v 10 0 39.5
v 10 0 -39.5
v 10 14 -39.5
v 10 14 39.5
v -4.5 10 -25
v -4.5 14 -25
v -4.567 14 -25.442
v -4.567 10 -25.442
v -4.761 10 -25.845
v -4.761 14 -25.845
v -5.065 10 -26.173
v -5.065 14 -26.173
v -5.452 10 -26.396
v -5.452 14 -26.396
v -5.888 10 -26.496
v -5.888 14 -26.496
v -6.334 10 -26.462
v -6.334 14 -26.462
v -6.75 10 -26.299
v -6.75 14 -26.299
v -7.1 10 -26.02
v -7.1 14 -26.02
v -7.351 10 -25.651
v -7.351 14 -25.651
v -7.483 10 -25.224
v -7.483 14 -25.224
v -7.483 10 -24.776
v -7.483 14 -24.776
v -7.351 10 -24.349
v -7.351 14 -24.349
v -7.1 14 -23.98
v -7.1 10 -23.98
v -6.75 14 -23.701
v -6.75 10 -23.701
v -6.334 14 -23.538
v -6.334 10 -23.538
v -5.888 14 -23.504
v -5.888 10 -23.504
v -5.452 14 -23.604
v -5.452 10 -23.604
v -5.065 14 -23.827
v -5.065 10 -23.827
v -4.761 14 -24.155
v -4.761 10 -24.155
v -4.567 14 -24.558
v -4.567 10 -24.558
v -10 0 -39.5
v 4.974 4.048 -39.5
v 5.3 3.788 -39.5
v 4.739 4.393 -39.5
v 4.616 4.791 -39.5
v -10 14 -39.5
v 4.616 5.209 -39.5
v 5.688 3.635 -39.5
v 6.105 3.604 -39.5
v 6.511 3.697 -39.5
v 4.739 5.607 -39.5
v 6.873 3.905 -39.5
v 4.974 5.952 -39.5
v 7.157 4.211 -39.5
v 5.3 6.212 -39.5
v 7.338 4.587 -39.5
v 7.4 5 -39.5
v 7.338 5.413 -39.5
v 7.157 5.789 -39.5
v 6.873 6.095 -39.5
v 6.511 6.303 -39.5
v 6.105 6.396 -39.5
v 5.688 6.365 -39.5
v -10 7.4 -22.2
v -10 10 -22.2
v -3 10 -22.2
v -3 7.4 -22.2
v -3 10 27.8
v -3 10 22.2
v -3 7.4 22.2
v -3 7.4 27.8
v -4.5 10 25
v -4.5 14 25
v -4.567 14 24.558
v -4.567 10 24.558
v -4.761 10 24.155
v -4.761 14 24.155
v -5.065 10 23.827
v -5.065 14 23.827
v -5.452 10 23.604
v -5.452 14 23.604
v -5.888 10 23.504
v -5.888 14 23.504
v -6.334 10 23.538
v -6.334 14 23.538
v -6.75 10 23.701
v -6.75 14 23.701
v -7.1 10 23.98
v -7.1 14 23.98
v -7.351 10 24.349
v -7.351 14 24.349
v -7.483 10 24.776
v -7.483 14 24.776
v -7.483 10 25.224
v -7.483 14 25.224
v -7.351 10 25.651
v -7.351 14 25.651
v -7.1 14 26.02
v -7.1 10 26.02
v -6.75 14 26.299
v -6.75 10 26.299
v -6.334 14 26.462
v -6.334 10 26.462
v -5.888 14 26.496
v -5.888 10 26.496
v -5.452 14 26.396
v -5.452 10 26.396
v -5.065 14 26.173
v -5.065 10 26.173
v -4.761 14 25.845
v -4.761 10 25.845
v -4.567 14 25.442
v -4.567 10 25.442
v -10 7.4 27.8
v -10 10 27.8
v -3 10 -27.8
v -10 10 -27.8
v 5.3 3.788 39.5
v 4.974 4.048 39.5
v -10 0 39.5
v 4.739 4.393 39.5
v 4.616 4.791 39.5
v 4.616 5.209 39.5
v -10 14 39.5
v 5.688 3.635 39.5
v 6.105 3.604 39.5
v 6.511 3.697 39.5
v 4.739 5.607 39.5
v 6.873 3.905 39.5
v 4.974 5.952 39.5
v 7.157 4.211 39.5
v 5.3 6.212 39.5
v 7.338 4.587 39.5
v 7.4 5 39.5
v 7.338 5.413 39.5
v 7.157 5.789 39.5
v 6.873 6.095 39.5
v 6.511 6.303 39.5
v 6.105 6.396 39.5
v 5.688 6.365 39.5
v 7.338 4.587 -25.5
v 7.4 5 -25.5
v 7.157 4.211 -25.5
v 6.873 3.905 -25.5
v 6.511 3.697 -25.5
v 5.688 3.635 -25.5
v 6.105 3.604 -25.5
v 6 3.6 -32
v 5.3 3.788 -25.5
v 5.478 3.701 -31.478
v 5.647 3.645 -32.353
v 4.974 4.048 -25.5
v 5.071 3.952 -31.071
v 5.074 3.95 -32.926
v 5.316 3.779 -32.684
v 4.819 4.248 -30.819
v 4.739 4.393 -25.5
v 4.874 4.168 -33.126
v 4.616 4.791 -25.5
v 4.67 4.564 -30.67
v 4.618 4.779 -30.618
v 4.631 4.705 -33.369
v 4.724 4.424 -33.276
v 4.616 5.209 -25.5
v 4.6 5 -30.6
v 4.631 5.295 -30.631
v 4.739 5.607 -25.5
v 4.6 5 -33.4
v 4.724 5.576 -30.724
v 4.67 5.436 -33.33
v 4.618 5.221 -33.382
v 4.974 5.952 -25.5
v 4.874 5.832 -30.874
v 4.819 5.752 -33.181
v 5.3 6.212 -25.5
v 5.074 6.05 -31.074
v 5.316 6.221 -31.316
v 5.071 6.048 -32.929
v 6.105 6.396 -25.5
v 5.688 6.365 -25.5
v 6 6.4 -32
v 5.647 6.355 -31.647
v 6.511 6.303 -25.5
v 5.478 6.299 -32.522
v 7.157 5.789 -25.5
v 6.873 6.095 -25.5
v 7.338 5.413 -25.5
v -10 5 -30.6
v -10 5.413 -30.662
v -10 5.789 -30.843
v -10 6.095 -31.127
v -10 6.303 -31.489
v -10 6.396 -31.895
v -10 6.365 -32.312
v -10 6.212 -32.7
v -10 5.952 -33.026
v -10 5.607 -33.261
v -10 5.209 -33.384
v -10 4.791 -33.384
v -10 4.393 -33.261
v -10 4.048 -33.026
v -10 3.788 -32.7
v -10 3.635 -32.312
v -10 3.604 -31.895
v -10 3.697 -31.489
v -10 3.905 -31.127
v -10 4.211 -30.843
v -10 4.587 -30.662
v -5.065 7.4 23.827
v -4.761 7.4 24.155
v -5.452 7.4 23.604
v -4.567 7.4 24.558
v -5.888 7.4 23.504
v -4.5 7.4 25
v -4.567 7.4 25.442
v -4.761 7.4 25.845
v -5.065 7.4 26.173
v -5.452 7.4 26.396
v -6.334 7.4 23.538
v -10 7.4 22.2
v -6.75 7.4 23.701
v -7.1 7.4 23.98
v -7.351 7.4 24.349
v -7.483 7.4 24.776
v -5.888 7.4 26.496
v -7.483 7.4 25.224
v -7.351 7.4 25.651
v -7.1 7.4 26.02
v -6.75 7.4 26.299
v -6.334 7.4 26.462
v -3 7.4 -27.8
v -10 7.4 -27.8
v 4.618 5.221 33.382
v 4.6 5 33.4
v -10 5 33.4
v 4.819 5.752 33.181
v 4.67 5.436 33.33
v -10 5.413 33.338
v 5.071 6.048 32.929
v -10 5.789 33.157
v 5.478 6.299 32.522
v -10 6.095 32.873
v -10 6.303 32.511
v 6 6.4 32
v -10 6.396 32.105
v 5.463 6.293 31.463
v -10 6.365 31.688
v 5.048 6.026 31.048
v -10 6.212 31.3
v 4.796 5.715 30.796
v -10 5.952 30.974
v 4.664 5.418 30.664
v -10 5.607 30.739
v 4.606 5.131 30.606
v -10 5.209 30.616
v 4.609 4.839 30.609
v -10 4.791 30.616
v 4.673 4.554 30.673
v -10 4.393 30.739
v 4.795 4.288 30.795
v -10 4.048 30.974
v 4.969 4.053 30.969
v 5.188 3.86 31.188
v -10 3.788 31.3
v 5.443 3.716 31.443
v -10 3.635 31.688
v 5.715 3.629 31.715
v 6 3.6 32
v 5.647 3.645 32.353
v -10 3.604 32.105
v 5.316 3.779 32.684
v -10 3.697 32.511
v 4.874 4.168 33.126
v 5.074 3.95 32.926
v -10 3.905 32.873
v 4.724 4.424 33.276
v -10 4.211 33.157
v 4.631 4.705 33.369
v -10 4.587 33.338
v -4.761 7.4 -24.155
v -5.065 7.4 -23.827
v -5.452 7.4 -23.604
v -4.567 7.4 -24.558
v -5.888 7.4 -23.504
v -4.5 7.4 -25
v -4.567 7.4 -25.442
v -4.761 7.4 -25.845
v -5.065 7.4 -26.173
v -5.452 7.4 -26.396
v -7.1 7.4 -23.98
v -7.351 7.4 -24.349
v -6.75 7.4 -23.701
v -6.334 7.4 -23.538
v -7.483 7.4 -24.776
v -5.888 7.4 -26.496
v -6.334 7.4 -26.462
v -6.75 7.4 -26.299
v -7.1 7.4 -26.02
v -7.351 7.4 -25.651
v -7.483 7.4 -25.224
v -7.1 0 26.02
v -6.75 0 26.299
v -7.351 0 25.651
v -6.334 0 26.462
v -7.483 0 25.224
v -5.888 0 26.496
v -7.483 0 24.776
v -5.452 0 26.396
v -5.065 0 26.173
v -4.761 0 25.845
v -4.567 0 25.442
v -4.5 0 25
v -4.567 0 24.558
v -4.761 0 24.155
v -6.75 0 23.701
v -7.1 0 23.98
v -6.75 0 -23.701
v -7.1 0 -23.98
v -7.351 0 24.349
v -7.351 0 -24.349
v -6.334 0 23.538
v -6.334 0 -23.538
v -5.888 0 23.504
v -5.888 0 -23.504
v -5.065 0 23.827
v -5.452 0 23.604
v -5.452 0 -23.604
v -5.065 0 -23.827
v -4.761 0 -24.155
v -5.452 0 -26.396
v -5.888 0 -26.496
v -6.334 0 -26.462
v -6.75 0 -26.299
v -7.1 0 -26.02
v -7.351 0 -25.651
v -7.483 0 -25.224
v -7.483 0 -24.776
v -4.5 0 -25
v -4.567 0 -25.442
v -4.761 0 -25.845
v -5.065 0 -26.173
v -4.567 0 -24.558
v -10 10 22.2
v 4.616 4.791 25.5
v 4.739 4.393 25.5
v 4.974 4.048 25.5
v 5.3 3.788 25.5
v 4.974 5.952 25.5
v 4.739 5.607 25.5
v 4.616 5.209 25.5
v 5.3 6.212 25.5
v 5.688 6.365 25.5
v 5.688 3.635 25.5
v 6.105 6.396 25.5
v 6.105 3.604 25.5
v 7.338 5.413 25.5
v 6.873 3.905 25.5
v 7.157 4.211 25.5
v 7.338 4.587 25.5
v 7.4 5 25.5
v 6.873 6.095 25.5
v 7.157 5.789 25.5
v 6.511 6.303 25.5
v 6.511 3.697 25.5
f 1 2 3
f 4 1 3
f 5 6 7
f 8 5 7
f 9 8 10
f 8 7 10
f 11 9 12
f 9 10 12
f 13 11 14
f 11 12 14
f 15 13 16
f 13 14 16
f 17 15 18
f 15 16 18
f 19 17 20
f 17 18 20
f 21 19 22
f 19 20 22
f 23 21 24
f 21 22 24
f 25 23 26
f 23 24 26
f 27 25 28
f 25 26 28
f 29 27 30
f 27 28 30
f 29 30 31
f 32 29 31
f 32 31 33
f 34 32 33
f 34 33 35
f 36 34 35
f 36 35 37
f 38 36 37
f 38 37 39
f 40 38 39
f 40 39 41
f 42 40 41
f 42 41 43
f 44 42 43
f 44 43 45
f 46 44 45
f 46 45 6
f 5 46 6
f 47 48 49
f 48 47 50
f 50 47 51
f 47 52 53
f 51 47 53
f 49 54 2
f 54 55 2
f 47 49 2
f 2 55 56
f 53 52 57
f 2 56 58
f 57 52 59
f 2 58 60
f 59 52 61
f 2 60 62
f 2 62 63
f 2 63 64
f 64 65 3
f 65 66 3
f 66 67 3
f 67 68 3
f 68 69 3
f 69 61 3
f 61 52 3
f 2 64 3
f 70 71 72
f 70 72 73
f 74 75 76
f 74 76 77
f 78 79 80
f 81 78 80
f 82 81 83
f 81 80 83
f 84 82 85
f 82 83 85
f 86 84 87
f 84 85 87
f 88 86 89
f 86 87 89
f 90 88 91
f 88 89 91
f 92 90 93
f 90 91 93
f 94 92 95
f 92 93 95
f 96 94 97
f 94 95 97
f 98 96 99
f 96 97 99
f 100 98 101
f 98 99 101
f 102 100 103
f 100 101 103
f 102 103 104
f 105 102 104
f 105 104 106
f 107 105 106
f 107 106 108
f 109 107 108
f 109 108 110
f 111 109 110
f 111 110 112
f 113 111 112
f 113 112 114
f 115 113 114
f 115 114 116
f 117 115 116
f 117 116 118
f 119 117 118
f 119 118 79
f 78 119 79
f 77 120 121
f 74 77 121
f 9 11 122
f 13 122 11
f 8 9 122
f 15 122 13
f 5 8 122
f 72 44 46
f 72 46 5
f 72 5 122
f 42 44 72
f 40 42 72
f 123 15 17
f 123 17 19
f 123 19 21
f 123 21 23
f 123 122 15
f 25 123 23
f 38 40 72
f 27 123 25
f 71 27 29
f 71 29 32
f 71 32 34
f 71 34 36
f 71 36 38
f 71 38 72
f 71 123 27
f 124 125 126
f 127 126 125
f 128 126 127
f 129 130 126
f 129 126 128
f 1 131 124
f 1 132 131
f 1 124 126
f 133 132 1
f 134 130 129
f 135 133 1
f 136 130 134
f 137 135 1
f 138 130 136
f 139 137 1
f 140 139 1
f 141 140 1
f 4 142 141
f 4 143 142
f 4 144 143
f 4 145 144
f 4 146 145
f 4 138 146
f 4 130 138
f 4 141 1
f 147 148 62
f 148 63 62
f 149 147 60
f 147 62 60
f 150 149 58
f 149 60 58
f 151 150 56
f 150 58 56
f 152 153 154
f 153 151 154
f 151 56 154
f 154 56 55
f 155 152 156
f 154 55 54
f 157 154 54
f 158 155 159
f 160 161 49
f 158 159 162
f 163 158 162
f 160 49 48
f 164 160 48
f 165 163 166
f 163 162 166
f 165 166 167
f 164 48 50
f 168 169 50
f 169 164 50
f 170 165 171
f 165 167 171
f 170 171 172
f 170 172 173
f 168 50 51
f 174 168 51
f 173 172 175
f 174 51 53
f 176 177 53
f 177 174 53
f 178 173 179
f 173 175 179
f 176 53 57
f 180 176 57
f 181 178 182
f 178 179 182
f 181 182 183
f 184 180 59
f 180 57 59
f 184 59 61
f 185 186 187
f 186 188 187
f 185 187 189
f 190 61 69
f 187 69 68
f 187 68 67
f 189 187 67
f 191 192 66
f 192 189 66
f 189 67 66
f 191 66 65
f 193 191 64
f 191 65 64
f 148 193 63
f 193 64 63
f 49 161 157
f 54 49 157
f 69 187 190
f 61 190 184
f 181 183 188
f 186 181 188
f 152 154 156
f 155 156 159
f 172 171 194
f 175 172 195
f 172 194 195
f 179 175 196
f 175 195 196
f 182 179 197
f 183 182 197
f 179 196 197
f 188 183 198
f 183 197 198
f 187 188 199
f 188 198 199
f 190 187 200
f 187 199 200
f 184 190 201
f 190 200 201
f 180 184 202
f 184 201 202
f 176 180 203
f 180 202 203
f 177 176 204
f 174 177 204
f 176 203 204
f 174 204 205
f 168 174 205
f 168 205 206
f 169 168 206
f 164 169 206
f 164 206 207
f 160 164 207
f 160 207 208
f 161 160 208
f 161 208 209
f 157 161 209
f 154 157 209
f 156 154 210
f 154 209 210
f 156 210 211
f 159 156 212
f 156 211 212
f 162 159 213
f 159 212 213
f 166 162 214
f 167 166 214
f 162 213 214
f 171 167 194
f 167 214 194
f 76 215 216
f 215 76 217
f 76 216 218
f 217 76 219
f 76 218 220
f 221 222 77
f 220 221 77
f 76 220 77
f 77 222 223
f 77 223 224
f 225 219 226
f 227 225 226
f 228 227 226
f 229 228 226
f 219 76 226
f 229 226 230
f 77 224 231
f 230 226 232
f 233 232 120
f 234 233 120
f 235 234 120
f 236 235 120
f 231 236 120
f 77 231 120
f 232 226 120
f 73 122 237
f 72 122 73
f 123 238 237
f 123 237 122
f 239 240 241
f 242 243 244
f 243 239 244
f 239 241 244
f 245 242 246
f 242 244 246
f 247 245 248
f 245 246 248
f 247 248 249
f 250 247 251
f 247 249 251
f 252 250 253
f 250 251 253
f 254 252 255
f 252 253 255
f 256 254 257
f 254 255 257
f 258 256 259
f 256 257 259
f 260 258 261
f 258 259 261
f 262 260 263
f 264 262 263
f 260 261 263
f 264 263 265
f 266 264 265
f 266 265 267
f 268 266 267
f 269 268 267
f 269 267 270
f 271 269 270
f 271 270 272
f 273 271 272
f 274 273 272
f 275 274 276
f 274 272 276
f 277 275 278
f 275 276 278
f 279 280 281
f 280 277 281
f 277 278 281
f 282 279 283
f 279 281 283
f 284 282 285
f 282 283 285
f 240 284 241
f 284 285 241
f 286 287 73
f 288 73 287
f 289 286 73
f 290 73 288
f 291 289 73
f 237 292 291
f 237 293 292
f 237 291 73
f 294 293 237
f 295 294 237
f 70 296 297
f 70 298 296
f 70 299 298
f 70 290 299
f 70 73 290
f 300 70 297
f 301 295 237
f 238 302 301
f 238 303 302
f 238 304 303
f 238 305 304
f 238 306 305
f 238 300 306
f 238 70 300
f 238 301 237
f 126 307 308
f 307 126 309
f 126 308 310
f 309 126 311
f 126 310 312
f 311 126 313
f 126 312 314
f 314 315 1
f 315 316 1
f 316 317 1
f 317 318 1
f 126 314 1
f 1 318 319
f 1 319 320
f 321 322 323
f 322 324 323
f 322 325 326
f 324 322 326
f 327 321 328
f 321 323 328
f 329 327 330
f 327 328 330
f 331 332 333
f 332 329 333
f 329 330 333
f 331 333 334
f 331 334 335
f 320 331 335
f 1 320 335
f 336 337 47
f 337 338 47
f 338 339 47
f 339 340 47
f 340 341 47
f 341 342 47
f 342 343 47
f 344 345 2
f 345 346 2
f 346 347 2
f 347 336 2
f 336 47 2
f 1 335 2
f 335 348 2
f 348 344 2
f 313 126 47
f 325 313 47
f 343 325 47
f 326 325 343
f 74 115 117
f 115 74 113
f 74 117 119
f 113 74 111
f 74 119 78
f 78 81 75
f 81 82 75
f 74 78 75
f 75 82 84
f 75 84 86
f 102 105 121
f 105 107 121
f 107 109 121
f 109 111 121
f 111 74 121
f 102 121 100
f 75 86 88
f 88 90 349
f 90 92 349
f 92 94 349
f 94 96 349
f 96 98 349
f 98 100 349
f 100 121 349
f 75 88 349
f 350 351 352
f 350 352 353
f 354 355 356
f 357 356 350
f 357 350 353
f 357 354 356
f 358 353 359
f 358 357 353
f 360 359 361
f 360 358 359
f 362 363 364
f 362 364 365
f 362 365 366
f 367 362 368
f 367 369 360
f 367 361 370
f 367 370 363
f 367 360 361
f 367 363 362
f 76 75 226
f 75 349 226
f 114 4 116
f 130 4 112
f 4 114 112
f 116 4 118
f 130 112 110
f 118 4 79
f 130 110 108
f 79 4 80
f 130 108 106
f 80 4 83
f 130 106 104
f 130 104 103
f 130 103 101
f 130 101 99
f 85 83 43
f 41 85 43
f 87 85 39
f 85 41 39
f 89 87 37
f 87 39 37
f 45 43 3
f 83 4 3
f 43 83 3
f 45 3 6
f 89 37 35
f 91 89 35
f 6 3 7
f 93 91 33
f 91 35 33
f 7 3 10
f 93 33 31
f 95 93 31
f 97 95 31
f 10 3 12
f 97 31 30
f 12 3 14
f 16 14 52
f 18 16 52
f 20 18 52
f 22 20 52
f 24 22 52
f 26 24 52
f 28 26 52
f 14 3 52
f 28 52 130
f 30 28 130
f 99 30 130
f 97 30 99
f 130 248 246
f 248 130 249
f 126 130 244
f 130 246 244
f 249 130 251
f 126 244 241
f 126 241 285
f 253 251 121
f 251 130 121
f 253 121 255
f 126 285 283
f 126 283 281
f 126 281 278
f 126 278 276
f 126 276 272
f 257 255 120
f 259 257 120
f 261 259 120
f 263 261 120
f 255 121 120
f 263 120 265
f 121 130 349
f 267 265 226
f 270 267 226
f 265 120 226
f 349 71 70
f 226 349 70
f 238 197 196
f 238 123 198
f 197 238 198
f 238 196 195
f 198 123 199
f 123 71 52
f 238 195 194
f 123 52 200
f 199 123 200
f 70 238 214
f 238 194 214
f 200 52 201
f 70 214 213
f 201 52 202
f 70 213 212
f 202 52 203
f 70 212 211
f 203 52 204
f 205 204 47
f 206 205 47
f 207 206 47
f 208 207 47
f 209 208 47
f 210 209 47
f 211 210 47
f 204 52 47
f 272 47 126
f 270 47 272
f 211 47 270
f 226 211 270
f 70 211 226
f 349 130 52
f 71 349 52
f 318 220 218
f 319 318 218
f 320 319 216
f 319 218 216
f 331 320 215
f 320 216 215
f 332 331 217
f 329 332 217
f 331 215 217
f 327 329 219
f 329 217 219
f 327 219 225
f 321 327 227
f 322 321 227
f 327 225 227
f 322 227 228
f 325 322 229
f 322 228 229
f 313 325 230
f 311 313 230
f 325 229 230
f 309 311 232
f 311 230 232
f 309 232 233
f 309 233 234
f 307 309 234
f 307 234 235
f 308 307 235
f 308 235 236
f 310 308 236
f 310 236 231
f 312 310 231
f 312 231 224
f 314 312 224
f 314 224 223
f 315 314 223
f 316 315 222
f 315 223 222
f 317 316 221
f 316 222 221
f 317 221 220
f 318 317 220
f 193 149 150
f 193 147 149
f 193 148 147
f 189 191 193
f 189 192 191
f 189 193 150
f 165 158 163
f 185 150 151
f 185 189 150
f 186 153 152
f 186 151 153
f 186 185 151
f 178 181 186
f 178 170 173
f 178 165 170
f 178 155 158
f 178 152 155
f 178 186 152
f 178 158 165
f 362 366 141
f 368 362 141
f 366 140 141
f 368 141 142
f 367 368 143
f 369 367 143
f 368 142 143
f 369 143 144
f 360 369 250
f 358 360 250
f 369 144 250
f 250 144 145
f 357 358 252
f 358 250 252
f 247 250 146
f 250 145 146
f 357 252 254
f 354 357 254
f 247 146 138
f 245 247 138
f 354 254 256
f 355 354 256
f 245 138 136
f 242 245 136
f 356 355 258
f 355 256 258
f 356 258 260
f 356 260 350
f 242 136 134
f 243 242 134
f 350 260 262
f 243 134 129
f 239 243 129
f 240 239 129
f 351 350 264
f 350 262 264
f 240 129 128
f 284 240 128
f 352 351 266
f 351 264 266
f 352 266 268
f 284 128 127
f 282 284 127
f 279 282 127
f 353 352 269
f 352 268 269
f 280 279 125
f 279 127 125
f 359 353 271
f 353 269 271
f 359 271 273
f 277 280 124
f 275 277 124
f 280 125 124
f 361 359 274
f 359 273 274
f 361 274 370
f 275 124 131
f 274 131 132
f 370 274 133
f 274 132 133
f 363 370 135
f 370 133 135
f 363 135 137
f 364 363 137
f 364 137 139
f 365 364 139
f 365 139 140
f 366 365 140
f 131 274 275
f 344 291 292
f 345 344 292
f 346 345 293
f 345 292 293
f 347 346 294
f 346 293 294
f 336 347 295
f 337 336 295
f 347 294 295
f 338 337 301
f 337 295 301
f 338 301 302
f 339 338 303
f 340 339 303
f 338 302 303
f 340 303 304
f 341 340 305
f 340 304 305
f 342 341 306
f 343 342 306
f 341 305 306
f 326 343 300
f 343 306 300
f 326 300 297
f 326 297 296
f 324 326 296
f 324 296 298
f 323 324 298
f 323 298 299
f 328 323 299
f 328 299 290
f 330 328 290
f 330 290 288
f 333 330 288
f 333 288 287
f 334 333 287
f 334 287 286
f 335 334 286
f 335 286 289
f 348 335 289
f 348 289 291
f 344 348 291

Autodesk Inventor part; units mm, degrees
ref_plane "YZ Plane" through (0, 0, 0) normal (1, 0, 0) x (0, 1, 0)
ref_plane "XZ Plane" through (0, 0, 0) normal (0, 1, 0) x (-1, 0, 0)
ref_plane "XY Plane" through (0, 0, 0) normal (0, 0, 1) x (1, 0, 0)
sketch "Эскиз1" plane through (0, 0, 0) normal (0, 0, 1) x (1, 0, 0)
  line L0 (-10, 0) -> (10, 0)
  line L1 (10, 0) -> (10, 14)
  line L2 (10, 14) -> (-10, 14)
  line L3 (-10, 14) -> (-10, 0)
  point P0 (0, 0)
  point P1 (0, 0)
  dimension "d0" = 20
  dimension "d1" = 14
extrude "Выдавливание1" add sketch "Эскиз1" along normal mid plane 79
sketch "Эскиз2" plane through (0, 0, 39.5) normal (0, 0, 1) x (1, 0, 0)
  circle A0 centre (6, 5) radius 1.4
  line L0 (-10, 0) -> (10, 0) projected
  line L1 (-10, 14) -> (-10, 0) projected
  point P0 (0, 0)
  point P1 (0, 0)
  dimension "d5" = 2.8
  dimension "d8" = 5
  dimension "d9" = 16
extrude "Выдавливание2" cut sketch "Эскиз2" against normal blind 14
sketch "Эскиз3" plane through (-10, 0, -39.5) normal (-1, 0, 0) x (0, 0, 1)
  circle A0 centre (71.5, 5) radius 1.4
  circle A1 centre (7.5, 5) radius 1.4
  line L0 (39.5, 0) -> (79, 0) projected
  line L1 (0, 14) -> (79, 14) projected
  line L2 (39.5, 0) -> (39.5, 14)
  dimension "d10" = 64
  dimension "d11" = 5
  dimension "d12" = 2.8
extrude "Выдавливание3" cut sketch "Эскиз3" against normal blind 16
mirror "Зеркальное отражение1" about plane through (0, 0, 0) normal (0, 0, 1) of "Выдавливание2"
sketch "Эскиз4" plane through (-10, 14, 39.5) normal (0, 1, 0) x (1, 0, 0)
  line L0 (0, 79) -> (0, 0) projected
  line L1 (0, 39.5) -> (20, 39.5)
  line L2 (20, 79) -> (20, 0) projected
  circle A0 centre (4, 64.5) radius 1.5
  circle A1 centre (4, 14.5) radius 1.5
  point P0 (10, 39.5)
  dimension "d15" = 50
  dimension "d16" = 3
  dimension "d17" = 4
extrude "Выдавливание4" cut sketch "Эскиз4" against normal through all
sketch "Эскиз5" plane through (-10, 0, 39.5) normal (-1, 0, 0) x (0, 0, 1)
  line L0 (-67.3, 10) -> (-61.7, 10)
  line L1 (-61.7, 10) -> (-61.7, 7.4)
  line L2 (-61.7, 7.4) -> (-67.3, 7.4)
  line L3 (-67.3, 7.4) -> (-67.3, 10)
  line L4 (-39.5, 0) -> (-39.5, 14)
  line L5 (-79, 14) -> (0, 14) projected
  line L6 (-11.7, 10) -> (-17.3, 10)
  line L7 (-17.3, 10) -> (-17.3, 7.4)
  line L8 (-17.3, 7.4) -> (-11.7, 7.4)
  line L9 (-11.7, 7.4) -> (-11.7, 10)
  line L10 (-63, 0) -> (-66, 0) projected
  line L11 (-66, 14) -> (-63, 14) projected
  point P0 (-64.5, 7.4)
  point P1 (-64.5, 0)
  dimension "d20" = 5.6
  dimension "d21" = 4
  dimension "d22" = 2.6
extrude "Выдавливание5" cut sketch "Эскиз5" against normal blind 7
properties part number "CupHolder"
